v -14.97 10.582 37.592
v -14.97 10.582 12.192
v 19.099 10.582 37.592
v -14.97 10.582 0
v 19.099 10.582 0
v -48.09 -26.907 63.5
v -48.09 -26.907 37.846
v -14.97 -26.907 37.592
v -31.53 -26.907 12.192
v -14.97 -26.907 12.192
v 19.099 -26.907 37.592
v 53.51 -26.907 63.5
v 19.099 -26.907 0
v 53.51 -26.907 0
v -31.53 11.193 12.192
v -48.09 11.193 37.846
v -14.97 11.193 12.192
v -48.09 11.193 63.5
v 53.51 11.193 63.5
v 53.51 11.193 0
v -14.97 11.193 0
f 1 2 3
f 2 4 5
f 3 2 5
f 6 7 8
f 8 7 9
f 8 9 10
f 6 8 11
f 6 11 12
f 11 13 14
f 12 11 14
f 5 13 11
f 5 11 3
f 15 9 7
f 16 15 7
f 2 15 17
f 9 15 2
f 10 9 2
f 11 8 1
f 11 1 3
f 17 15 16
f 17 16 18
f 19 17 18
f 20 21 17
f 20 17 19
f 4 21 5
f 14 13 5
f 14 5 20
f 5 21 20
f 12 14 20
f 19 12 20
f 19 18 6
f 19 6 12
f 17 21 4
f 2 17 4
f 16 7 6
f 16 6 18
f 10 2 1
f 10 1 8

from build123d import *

# Parameters (mm, degrees)
F0_W     = 101.6
F0_H     = 38.1
F2_DEPTH = 63.5
F1_W     = 34.0687744319
F1_H     = 0.7092284867
F1_H_2   = 37.4890945023
F3_DEPTH = 37.592
F5_DEPTH = 12.192
F7_DEPTH = 50.8


with BuildPart() as f2:
    # F0 (on Top) → F2 (new body)
    with BuildSketch(Plane.XY):
        with Locations((2.7100164443, -7.8571270815)):
            Rectangle(F0_W, F0_H)
    extrude(amount=F2_DEPTH)

    # F1 (on face) → F3 (cut)
    with BuildSketch(Plane.XY):
        with Locations((2.0647738129, -27.2617413248)):
            Rectangle(F1_W, F1_H)
        with Locations((2.0647738129, -8.1625798303)):
            Rectangle(F1_W, F1_H_2)
    extrude(amount=F3_DEPTH, mode=Mode.SUBTRACT)

    # F4 (on face) → F5 (cut)
    with BuildSketch(Plane(origin=(0, 0, 0), x_dir=(1, 0, 0), z_dir=(0, 0, -1))):
        Polygon((-48.0899835557, -11.1928729185), (-14.9696134031, -11.1928729185), (-14.9696134031, -10.5819674209), (-14.9696134031, 26.9071270815), (-48.0899835557, 26.9071270815), align=None)
    extrude(amount=-F5_DEPTH, mode=Mode.SUBTRACT)

    # F6 (on face) → F7 (cut)
    with BuildSketch(Plane.XZ.offset(26.9071270815)):
        Polygon((-48.0899835557, 12.192), (-31.5297984794, 12.192), (-48.0899835557, 37.846), align=None)
    extrude(amount=-F7_DEPTH, mode=Mode.SUBTRACT)


solid = f2.part
